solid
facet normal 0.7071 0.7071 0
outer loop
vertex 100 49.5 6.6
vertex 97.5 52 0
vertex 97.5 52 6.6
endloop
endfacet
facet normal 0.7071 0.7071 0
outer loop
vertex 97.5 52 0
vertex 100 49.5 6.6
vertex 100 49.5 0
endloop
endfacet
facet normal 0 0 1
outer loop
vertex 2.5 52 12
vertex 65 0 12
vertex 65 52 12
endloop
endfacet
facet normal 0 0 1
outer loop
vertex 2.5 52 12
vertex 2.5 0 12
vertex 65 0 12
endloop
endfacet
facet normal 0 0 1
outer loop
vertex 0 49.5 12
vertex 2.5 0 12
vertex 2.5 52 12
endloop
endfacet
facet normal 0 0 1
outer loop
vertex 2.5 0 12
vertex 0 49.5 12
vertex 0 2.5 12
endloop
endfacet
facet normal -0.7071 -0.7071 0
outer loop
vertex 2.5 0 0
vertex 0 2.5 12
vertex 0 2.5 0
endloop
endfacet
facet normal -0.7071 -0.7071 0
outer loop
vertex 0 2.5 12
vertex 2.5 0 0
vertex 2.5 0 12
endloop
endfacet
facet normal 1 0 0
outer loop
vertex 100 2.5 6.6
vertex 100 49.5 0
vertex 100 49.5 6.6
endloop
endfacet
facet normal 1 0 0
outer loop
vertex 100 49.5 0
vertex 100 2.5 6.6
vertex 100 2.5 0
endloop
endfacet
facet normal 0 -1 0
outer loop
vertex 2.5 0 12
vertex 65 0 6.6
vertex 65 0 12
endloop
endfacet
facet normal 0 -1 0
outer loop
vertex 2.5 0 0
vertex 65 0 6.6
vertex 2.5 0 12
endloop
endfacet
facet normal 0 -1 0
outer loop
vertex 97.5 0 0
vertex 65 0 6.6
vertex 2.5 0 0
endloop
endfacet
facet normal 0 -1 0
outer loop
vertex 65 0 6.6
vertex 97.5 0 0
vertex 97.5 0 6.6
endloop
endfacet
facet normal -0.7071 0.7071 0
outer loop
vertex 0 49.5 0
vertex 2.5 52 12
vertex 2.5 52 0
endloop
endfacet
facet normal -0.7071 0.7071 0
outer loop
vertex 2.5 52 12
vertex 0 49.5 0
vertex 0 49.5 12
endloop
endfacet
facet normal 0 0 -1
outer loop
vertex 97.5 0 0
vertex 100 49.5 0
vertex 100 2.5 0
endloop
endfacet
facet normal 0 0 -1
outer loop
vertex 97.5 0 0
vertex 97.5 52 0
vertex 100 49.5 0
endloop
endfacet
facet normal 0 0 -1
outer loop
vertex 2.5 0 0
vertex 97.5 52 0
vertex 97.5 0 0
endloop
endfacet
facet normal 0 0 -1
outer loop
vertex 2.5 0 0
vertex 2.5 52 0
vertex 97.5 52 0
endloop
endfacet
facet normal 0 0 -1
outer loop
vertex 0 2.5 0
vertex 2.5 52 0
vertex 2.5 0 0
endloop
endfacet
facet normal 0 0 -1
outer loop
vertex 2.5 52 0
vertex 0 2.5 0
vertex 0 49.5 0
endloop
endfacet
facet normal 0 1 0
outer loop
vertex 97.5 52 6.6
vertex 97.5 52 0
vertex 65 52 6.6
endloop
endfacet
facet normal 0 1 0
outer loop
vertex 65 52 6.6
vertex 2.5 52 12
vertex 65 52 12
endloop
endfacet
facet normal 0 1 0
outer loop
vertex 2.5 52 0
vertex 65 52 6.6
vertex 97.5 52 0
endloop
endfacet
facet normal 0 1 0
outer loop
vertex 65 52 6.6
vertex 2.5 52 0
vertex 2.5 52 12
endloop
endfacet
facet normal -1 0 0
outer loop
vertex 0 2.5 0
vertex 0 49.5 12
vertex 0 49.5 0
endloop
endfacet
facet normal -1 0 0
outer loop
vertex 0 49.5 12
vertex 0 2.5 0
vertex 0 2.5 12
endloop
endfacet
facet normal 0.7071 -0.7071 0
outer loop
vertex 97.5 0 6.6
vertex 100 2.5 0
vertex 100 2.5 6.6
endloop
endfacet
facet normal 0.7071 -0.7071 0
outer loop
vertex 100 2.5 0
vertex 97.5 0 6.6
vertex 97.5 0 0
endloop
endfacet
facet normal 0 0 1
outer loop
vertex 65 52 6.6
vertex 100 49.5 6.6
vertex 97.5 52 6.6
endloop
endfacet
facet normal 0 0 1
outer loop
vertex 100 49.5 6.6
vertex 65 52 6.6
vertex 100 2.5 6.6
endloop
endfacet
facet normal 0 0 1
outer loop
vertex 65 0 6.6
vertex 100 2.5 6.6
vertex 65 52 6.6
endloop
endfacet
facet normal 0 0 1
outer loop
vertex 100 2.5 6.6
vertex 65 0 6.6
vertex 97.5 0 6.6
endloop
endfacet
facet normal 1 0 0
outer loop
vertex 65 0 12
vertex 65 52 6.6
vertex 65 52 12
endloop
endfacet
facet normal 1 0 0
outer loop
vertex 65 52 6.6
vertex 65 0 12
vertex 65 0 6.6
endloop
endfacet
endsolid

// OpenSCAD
$fn = 32;

// ----------------------------------------------------------------------
// Stepped bar: endstep, 100 x 52 x 12/6.6 mm
// ----------------------------------------------------------------------

// --- parameters (mm) ---
bar_l = 100;              // bar length, X
bar_w = 52;               // bar width, Y
plate_t = 12;             // thickness of the thick zone, Z
thin_t = 6.6;             // thickness of the thin zone
corner_c = 2.5;           // corner chamfer of the bar
step_cut = 5.4;           // material removed from the thin zone
step_x = 65;              // step position from the left end
depth_1 = 5.4;            // depth of cut 1 from the top face
fit_tol = 0.05;           // declared fit tolerance (prompt contract)
free_tol = 0.3;           // declared free tolerance (prompt contract)

profile = [[2.5, 0], [97.5, 0], [100, 2.5], [100, 49.5], [97.5, 52], [2.5, 52], [0, 49.5], [0, 2.5]];  // primary outline, 8 points, counter clockwise
void_1 = [[65, -1], [101, -1], [101, 53], [65, 53]];  // thin zone beyond the step, 4 points

// --- the one profile operation ---
difference() {
  linear_extrude(height = plate_t) polygon(points = profile);
  translate([0, 0, plate_t - depth_1])
    linear_extrude(height = depth_1 + 1) polygon(points = void_1);
}
